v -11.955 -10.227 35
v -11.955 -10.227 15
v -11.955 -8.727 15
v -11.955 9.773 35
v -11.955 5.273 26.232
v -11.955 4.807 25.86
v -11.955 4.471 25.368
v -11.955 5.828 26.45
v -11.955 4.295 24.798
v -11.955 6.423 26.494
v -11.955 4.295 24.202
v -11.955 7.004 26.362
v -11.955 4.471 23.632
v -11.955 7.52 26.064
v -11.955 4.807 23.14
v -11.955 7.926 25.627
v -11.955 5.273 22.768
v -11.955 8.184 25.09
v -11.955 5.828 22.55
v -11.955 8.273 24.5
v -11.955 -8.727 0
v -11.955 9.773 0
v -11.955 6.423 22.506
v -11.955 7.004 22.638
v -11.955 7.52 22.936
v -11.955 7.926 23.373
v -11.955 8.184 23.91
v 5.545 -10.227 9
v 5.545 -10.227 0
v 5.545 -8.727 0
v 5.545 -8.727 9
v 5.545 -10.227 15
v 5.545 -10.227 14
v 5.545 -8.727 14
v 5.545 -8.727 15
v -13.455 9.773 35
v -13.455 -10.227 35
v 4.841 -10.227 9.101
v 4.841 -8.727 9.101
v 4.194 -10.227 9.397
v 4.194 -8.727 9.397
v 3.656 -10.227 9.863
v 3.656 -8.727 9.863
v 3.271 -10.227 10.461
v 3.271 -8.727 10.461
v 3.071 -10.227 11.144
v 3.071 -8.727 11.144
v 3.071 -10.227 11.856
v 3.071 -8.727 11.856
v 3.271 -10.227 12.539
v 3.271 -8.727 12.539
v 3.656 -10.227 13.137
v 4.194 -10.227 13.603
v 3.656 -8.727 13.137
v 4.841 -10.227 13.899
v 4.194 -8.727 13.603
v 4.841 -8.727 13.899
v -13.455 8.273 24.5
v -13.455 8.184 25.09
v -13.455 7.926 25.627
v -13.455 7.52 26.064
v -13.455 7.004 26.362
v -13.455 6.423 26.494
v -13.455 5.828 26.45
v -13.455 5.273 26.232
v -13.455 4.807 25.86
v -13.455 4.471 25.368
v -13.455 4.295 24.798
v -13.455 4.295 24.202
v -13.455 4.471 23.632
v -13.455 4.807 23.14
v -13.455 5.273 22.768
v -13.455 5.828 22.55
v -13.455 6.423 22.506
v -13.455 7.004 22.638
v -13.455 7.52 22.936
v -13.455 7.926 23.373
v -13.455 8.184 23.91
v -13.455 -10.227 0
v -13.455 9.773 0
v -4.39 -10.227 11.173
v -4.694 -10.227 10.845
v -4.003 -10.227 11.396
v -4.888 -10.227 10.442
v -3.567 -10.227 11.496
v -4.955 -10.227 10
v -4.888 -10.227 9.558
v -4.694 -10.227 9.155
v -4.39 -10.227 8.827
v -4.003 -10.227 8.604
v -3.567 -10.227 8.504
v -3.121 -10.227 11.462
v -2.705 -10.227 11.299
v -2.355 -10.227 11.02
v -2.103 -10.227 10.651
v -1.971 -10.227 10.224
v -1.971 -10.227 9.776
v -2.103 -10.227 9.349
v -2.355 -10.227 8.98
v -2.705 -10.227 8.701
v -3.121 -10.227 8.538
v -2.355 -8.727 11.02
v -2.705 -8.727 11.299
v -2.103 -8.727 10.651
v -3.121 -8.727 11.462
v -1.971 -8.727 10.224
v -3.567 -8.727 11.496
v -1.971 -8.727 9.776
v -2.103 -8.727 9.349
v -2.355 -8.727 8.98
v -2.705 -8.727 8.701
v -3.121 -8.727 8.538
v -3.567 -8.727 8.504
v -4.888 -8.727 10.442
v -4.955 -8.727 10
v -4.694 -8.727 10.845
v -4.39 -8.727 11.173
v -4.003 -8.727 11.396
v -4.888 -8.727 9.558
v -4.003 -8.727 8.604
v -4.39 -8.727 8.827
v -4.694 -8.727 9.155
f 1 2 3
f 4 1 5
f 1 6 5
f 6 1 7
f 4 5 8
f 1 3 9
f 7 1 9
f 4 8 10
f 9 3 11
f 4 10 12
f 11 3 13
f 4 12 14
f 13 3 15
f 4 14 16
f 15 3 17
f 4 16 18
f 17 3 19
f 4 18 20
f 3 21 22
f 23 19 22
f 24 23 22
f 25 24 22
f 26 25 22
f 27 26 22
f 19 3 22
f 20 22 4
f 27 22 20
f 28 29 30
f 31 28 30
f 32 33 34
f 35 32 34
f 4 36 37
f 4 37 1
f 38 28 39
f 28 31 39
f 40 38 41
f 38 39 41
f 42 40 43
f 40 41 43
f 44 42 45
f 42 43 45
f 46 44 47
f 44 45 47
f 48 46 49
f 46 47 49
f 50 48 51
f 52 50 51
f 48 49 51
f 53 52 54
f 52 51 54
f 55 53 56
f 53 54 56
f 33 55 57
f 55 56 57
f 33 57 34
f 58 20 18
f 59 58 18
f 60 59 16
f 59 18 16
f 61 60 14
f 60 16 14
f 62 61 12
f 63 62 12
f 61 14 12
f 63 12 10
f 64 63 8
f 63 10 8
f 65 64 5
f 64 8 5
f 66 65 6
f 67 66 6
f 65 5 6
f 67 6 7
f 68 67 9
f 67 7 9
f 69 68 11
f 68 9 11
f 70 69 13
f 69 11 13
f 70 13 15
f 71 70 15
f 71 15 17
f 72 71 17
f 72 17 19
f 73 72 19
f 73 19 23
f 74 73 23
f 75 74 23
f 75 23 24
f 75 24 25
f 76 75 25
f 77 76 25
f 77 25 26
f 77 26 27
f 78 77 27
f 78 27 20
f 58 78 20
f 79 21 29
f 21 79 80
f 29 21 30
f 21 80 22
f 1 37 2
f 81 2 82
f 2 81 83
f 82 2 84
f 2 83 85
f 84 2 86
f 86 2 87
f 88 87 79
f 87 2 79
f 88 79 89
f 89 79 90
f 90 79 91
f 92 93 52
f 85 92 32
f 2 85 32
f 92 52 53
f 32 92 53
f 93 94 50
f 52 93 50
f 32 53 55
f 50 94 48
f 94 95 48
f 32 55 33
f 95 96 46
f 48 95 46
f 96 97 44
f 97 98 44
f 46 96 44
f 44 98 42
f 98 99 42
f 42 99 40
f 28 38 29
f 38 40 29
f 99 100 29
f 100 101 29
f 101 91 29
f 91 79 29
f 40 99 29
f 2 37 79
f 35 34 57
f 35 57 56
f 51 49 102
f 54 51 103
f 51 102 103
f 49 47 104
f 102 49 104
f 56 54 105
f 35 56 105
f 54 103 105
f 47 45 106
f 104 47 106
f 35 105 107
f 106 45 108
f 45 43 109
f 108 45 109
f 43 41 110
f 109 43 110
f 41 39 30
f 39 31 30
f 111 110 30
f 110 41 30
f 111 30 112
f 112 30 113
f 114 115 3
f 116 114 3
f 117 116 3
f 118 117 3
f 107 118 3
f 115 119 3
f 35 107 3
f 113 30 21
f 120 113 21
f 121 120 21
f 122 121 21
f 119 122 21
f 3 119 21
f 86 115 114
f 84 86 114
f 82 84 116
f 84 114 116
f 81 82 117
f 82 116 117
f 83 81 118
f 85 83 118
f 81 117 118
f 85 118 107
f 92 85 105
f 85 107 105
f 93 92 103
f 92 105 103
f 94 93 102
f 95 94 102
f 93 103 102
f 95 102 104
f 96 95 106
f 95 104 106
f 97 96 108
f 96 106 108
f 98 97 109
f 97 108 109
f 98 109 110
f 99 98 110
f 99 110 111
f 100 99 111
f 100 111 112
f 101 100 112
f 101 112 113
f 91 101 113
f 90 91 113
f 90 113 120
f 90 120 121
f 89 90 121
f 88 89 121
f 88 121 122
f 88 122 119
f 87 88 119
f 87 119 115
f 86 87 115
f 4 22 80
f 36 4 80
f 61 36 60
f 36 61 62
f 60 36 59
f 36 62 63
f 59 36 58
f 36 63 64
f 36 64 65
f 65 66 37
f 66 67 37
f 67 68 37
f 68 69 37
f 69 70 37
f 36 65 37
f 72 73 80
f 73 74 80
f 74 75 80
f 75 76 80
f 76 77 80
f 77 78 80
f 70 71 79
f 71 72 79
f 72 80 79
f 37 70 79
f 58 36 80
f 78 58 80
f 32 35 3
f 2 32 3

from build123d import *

# Parameters (mm, degrees)
EXTRUSION1_DEPTH = 35
ESQUISSE2_R      = 2
EXTRUSION2_DEPTH = 17
ESQUISSE4_R      = 1.5
ESQUISSE4_R_2    = 2.5
ESQUISSE4_W      = 17.5
ESQUISSE4_H      = 20
EXTRUSION3_DEPTH = 17


with BuildPart() as part:
    # Esquisse1 → Extrusion1 (new body)
    with BuildSketch(Plane.XY):
        Polygon((-13.454581117, 9.773157895), (-13.454581117, -10.226842105), (5.545418883, -10.226842105), (5.545418883, -8.726842105), (-11.954581117, -8.726842105), (-11.954581117, 9.773157895), align=None)
    extrude(amount=EXTRUSION1_DEPTH)

    # Esquisse2 → Extrusion2 (cut)
    with BuildSketch(Plane(origin=(-11.954581117, 0, 0), x_dir=(0, 0, -1), z_dir=(1, 0, 0))):
        with Locations(Location((-24.5, 6.273157895, 0), (0, 0, 90))):
            Circle(ESQUISSE2_R)
    extrude(amount=-EXTRUSION2_DEPTH, mode=Mode.SUBTRACT)

    # Esquisse4 → Extrusion3 (cut)
    with BuildSketch(Plane(origin=(0, -8.726842105, 0), x_dir=(-1, 0, 0), z_dir=(0, 1, 0))):
        with Locations((3.454581117, 10)):
            Circle(ESQUISSE4_R)
        with Locations((-5.545418883, 11.5)):
            Circle(ESQUISSE4_R_2)
        with Locations((3.204581117, 25)):
            Rectangle(ESQUISSE4_W, ESQUISSE4_H)
    extrude(amount=-EXTRUSION3_DEPTH, mode=Mode.SUBTRACT)


solid = part.part
